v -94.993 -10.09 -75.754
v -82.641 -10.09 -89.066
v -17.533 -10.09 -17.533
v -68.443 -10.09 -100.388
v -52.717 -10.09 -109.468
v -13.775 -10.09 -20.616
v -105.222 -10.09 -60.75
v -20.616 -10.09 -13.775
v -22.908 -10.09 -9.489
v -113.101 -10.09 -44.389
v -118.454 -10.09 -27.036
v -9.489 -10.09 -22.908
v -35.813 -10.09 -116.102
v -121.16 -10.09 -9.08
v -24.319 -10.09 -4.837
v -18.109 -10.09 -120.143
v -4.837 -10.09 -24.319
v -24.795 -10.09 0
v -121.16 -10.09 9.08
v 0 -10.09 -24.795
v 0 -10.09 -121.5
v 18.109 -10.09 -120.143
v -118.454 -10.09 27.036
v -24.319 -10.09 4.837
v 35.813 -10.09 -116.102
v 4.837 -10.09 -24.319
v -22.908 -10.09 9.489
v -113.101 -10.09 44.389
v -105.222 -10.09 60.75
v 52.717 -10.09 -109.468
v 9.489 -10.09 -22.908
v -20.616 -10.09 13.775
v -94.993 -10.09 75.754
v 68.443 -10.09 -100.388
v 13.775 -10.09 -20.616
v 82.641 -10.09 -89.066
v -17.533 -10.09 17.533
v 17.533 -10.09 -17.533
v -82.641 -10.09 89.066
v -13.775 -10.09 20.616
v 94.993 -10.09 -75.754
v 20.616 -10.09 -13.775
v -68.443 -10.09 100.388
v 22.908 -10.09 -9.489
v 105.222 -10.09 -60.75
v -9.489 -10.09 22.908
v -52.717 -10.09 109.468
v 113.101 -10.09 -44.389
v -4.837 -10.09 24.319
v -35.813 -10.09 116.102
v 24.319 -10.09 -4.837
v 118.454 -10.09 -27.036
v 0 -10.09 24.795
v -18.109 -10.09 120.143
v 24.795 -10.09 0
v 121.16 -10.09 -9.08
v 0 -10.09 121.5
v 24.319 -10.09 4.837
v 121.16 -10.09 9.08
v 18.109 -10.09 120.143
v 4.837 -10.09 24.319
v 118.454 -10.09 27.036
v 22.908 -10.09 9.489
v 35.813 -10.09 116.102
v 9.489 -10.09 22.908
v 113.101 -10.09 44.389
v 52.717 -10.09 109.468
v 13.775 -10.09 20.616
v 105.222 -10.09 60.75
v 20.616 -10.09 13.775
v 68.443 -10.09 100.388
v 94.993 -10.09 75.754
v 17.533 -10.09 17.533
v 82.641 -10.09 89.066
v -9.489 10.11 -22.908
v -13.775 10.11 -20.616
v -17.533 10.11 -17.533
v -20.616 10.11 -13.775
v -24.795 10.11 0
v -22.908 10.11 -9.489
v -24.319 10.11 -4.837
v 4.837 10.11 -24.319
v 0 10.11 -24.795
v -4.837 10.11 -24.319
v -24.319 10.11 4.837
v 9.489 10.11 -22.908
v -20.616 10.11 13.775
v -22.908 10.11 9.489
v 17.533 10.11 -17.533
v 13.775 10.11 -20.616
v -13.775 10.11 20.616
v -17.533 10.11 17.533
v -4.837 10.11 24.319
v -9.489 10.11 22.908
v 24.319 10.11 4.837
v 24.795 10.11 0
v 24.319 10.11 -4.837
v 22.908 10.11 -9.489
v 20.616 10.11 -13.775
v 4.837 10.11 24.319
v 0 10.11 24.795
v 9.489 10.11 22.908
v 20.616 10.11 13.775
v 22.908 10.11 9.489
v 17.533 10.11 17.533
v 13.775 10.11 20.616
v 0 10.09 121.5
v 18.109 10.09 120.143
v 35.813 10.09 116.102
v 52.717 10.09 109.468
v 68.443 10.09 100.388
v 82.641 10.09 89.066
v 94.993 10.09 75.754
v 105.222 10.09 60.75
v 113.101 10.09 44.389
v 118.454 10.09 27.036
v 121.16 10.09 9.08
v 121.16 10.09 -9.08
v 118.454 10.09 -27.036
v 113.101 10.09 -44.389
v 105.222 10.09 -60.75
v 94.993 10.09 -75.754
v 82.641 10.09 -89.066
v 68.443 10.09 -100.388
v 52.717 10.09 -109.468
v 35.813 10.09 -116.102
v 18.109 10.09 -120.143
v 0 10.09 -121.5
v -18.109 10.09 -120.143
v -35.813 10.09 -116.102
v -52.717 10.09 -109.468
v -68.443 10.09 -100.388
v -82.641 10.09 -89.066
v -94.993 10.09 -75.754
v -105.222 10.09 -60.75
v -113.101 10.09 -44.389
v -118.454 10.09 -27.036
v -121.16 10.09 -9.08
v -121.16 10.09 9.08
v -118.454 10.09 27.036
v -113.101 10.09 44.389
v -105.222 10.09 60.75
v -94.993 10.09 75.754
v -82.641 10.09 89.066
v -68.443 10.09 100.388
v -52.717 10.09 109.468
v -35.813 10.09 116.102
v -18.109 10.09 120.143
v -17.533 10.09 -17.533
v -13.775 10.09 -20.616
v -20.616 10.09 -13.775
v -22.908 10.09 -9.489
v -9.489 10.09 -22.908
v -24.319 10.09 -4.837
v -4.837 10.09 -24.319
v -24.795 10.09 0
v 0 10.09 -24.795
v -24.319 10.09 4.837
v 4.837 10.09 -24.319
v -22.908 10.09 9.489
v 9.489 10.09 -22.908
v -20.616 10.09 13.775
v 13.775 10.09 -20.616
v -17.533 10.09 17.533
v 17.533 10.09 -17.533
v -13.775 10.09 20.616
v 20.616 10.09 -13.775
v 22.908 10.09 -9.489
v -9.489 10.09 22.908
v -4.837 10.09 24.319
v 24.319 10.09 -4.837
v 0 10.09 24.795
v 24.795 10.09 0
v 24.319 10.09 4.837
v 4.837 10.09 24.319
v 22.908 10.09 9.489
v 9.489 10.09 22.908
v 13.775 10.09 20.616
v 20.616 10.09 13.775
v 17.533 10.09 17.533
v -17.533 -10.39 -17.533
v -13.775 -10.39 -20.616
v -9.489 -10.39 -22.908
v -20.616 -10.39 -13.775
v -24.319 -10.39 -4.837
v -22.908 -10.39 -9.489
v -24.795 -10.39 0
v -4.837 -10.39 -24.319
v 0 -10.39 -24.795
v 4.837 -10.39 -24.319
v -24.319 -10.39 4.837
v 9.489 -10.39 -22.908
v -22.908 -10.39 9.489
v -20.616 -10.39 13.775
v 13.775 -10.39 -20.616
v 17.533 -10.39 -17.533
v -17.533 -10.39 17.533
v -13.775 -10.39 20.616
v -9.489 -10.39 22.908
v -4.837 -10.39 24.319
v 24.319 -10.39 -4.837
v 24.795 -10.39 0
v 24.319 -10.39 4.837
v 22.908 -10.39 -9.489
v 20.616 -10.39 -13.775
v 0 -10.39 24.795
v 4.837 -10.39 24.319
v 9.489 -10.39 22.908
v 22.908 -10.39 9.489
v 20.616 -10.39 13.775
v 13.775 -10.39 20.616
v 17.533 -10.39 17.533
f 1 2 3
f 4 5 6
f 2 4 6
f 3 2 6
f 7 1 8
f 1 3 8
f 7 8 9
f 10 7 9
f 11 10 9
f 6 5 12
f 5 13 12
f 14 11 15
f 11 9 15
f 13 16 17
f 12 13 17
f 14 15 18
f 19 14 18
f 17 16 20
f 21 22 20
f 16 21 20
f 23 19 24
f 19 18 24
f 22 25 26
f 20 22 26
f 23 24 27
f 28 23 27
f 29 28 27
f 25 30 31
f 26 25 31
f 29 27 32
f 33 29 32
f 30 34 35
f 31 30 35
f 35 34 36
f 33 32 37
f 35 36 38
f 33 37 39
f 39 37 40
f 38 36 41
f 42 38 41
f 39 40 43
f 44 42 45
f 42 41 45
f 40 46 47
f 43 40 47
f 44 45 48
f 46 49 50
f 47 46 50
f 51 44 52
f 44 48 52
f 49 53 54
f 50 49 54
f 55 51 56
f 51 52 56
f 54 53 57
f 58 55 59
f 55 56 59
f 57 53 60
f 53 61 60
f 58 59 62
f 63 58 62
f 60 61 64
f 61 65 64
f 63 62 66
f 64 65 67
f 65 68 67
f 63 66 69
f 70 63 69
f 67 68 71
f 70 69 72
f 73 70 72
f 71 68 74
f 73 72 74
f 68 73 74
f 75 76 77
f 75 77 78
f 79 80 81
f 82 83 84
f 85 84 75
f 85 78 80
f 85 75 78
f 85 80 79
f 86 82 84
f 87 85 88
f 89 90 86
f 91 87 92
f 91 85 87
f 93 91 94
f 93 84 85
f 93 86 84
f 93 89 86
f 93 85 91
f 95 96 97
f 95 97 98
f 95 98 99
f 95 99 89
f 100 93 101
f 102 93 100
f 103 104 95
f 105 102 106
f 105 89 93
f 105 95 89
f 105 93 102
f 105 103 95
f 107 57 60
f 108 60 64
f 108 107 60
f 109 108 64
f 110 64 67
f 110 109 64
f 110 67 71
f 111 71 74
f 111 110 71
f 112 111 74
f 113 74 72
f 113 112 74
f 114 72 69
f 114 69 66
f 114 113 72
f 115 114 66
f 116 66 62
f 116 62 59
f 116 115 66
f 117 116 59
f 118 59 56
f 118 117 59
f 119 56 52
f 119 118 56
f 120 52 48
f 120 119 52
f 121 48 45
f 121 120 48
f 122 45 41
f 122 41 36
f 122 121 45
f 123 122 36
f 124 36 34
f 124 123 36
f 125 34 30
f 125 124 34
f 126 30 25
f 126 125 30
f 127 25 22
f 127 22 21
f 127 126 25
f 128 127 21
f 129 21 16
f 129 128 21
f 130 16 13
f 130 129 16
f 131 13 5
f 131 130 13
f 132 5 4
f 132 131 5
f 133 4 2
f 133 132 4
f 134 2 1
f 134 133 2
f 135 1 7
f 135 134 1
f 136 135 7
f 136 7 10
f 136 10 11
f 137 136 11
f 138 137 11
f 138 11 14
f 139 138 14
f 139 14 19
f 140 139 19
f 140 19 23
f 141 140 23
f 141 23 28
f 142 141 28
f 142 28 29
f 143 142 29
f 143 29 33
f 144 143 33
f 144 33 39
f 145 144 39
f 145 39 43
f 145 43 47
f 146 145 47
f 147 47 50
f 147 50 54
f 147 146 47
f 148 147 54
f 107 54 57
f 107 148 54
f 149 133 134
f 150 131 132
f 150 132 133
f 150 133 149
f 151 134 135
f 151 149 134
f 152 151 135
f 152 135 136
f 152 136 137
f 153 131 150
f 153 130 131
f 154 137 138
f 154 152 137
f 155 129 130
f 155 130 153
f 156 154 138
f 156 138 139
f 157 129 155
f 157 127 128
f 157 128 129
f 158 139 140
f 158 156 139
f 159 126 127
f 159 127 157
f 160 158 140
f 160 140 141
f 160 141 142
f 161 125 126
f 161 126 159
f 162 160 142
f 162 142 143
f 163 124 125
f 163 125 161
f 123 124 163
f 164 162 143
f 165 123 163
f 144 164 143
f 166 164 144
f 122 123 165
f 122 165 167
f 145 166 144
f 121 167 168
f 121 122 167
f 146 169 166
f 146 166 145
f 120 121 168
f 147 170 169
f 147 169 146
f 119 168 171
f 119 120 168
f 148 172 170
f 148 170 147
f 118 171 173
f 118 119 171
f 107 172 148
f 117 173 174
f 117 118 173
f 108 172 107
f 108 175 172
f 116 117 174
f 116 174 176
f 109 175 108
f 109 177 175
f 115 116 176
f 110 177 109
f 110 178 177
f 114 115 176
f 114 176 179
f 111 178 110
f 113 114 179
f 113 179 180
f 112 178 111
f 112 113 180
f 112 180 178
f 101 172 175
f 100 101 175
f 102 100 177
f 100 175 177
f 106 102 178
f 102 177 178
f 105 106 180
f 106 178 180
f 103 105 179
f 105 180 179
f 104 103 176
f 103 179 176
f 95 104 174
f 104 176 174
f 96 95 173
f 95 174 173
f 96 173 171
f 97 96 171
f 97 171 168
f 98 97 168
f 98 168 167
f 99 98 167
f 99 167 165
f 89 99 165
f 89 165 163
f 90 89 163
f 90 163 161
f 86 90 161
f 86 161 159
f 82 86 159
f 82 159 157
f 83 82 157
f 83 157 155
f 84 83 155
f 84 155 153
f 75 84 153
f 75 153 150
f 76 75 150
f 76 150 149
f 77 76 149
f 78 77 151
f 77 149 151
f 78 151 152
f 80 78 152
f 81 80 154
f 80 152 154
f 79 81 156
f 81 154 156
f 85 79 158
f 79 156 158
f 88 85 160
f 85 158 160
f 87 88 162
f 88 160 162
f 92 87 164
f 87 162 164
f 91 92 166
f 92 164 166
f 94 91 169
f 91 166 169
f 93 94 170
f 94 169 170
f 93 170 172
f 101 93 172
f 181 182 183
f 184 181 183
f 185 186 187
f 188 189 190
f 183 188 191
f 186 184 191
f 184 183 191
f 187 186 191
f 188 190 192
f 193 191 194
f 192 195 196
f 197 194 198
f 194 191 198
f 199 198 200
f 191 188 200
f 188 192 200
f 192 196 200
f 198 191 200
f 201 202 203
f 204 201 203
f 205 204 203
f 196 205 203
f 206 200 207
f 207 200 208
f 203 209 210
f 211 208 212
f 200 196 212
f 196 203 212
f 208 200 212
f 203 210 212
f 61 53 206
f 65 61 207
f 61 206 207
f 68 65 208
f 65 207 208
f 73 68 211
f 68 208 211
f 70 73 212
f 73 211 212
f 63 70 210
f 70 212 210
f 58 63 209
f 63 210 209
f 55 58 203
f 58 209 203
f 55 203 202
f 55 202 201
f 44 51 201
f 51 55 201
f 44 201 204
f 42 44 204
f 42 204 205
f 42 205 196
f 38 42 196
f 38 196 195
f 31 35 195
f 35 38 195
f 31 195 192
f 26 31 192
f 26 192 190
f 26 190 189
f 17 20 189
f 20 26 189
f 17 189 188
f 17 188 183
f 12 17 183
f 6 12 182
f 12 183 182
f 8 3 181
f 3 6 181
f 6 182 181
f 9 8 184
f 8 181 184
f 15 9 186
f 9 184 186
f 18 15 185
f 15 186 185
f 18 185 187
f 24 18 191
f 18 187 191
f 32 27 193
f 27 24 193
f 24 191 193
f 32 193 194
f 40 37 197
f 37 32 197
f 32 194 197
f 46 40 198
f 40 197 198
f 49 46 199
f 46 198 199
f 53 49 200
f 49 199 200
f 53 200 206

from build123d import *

# Parameters (mm, degrees)
SKETCH1_R                = 121.5
BOSS_EXTRUDE1_DEPTH      = 10.09
BOSS_EXTRUDE2_DEPTH      = 10.11
BOSS_EXTRUDE2_DEPTH_BACK = 10.39
SKETCH2_R                = 24.795


with BuildPart() as part:
    # Sketch1 → Boss-Extrude1 (new, symmetric)
    with BuildSketch(Plane(origin=(0, 0, 0), x_dir=(1, 0, 0), z_dir=(0, 1, 0))):
        with Locations(Location((0, 0, 0), (0, 0, 270))):
            Circle(SKETCH1_R)
    extrude(amount=BOSS_EXTRUDE1_DEPTH, both=True)

    # Sketch2 → Boss-Extrude2 (add, two sides: drawn at the far end of the back side and taken through both)
    with BuildSketch(Plane(origin=(0, 0, 0), x_dir=(1, 0, 0), z_dir=(0, 1, 0)).offset(-BOSS_EXTRUDE2_DEPTH_BACK)):
        with Locations(Location((0, 0, 0), (0, 0, 270))):
            Circle(SKETCH2_R)
    extrude(amount=BOSS_EXTRUDE2_DEPTH + BOSS_EXTRUDE2_DEPTH_BACK)


solid = part.part
